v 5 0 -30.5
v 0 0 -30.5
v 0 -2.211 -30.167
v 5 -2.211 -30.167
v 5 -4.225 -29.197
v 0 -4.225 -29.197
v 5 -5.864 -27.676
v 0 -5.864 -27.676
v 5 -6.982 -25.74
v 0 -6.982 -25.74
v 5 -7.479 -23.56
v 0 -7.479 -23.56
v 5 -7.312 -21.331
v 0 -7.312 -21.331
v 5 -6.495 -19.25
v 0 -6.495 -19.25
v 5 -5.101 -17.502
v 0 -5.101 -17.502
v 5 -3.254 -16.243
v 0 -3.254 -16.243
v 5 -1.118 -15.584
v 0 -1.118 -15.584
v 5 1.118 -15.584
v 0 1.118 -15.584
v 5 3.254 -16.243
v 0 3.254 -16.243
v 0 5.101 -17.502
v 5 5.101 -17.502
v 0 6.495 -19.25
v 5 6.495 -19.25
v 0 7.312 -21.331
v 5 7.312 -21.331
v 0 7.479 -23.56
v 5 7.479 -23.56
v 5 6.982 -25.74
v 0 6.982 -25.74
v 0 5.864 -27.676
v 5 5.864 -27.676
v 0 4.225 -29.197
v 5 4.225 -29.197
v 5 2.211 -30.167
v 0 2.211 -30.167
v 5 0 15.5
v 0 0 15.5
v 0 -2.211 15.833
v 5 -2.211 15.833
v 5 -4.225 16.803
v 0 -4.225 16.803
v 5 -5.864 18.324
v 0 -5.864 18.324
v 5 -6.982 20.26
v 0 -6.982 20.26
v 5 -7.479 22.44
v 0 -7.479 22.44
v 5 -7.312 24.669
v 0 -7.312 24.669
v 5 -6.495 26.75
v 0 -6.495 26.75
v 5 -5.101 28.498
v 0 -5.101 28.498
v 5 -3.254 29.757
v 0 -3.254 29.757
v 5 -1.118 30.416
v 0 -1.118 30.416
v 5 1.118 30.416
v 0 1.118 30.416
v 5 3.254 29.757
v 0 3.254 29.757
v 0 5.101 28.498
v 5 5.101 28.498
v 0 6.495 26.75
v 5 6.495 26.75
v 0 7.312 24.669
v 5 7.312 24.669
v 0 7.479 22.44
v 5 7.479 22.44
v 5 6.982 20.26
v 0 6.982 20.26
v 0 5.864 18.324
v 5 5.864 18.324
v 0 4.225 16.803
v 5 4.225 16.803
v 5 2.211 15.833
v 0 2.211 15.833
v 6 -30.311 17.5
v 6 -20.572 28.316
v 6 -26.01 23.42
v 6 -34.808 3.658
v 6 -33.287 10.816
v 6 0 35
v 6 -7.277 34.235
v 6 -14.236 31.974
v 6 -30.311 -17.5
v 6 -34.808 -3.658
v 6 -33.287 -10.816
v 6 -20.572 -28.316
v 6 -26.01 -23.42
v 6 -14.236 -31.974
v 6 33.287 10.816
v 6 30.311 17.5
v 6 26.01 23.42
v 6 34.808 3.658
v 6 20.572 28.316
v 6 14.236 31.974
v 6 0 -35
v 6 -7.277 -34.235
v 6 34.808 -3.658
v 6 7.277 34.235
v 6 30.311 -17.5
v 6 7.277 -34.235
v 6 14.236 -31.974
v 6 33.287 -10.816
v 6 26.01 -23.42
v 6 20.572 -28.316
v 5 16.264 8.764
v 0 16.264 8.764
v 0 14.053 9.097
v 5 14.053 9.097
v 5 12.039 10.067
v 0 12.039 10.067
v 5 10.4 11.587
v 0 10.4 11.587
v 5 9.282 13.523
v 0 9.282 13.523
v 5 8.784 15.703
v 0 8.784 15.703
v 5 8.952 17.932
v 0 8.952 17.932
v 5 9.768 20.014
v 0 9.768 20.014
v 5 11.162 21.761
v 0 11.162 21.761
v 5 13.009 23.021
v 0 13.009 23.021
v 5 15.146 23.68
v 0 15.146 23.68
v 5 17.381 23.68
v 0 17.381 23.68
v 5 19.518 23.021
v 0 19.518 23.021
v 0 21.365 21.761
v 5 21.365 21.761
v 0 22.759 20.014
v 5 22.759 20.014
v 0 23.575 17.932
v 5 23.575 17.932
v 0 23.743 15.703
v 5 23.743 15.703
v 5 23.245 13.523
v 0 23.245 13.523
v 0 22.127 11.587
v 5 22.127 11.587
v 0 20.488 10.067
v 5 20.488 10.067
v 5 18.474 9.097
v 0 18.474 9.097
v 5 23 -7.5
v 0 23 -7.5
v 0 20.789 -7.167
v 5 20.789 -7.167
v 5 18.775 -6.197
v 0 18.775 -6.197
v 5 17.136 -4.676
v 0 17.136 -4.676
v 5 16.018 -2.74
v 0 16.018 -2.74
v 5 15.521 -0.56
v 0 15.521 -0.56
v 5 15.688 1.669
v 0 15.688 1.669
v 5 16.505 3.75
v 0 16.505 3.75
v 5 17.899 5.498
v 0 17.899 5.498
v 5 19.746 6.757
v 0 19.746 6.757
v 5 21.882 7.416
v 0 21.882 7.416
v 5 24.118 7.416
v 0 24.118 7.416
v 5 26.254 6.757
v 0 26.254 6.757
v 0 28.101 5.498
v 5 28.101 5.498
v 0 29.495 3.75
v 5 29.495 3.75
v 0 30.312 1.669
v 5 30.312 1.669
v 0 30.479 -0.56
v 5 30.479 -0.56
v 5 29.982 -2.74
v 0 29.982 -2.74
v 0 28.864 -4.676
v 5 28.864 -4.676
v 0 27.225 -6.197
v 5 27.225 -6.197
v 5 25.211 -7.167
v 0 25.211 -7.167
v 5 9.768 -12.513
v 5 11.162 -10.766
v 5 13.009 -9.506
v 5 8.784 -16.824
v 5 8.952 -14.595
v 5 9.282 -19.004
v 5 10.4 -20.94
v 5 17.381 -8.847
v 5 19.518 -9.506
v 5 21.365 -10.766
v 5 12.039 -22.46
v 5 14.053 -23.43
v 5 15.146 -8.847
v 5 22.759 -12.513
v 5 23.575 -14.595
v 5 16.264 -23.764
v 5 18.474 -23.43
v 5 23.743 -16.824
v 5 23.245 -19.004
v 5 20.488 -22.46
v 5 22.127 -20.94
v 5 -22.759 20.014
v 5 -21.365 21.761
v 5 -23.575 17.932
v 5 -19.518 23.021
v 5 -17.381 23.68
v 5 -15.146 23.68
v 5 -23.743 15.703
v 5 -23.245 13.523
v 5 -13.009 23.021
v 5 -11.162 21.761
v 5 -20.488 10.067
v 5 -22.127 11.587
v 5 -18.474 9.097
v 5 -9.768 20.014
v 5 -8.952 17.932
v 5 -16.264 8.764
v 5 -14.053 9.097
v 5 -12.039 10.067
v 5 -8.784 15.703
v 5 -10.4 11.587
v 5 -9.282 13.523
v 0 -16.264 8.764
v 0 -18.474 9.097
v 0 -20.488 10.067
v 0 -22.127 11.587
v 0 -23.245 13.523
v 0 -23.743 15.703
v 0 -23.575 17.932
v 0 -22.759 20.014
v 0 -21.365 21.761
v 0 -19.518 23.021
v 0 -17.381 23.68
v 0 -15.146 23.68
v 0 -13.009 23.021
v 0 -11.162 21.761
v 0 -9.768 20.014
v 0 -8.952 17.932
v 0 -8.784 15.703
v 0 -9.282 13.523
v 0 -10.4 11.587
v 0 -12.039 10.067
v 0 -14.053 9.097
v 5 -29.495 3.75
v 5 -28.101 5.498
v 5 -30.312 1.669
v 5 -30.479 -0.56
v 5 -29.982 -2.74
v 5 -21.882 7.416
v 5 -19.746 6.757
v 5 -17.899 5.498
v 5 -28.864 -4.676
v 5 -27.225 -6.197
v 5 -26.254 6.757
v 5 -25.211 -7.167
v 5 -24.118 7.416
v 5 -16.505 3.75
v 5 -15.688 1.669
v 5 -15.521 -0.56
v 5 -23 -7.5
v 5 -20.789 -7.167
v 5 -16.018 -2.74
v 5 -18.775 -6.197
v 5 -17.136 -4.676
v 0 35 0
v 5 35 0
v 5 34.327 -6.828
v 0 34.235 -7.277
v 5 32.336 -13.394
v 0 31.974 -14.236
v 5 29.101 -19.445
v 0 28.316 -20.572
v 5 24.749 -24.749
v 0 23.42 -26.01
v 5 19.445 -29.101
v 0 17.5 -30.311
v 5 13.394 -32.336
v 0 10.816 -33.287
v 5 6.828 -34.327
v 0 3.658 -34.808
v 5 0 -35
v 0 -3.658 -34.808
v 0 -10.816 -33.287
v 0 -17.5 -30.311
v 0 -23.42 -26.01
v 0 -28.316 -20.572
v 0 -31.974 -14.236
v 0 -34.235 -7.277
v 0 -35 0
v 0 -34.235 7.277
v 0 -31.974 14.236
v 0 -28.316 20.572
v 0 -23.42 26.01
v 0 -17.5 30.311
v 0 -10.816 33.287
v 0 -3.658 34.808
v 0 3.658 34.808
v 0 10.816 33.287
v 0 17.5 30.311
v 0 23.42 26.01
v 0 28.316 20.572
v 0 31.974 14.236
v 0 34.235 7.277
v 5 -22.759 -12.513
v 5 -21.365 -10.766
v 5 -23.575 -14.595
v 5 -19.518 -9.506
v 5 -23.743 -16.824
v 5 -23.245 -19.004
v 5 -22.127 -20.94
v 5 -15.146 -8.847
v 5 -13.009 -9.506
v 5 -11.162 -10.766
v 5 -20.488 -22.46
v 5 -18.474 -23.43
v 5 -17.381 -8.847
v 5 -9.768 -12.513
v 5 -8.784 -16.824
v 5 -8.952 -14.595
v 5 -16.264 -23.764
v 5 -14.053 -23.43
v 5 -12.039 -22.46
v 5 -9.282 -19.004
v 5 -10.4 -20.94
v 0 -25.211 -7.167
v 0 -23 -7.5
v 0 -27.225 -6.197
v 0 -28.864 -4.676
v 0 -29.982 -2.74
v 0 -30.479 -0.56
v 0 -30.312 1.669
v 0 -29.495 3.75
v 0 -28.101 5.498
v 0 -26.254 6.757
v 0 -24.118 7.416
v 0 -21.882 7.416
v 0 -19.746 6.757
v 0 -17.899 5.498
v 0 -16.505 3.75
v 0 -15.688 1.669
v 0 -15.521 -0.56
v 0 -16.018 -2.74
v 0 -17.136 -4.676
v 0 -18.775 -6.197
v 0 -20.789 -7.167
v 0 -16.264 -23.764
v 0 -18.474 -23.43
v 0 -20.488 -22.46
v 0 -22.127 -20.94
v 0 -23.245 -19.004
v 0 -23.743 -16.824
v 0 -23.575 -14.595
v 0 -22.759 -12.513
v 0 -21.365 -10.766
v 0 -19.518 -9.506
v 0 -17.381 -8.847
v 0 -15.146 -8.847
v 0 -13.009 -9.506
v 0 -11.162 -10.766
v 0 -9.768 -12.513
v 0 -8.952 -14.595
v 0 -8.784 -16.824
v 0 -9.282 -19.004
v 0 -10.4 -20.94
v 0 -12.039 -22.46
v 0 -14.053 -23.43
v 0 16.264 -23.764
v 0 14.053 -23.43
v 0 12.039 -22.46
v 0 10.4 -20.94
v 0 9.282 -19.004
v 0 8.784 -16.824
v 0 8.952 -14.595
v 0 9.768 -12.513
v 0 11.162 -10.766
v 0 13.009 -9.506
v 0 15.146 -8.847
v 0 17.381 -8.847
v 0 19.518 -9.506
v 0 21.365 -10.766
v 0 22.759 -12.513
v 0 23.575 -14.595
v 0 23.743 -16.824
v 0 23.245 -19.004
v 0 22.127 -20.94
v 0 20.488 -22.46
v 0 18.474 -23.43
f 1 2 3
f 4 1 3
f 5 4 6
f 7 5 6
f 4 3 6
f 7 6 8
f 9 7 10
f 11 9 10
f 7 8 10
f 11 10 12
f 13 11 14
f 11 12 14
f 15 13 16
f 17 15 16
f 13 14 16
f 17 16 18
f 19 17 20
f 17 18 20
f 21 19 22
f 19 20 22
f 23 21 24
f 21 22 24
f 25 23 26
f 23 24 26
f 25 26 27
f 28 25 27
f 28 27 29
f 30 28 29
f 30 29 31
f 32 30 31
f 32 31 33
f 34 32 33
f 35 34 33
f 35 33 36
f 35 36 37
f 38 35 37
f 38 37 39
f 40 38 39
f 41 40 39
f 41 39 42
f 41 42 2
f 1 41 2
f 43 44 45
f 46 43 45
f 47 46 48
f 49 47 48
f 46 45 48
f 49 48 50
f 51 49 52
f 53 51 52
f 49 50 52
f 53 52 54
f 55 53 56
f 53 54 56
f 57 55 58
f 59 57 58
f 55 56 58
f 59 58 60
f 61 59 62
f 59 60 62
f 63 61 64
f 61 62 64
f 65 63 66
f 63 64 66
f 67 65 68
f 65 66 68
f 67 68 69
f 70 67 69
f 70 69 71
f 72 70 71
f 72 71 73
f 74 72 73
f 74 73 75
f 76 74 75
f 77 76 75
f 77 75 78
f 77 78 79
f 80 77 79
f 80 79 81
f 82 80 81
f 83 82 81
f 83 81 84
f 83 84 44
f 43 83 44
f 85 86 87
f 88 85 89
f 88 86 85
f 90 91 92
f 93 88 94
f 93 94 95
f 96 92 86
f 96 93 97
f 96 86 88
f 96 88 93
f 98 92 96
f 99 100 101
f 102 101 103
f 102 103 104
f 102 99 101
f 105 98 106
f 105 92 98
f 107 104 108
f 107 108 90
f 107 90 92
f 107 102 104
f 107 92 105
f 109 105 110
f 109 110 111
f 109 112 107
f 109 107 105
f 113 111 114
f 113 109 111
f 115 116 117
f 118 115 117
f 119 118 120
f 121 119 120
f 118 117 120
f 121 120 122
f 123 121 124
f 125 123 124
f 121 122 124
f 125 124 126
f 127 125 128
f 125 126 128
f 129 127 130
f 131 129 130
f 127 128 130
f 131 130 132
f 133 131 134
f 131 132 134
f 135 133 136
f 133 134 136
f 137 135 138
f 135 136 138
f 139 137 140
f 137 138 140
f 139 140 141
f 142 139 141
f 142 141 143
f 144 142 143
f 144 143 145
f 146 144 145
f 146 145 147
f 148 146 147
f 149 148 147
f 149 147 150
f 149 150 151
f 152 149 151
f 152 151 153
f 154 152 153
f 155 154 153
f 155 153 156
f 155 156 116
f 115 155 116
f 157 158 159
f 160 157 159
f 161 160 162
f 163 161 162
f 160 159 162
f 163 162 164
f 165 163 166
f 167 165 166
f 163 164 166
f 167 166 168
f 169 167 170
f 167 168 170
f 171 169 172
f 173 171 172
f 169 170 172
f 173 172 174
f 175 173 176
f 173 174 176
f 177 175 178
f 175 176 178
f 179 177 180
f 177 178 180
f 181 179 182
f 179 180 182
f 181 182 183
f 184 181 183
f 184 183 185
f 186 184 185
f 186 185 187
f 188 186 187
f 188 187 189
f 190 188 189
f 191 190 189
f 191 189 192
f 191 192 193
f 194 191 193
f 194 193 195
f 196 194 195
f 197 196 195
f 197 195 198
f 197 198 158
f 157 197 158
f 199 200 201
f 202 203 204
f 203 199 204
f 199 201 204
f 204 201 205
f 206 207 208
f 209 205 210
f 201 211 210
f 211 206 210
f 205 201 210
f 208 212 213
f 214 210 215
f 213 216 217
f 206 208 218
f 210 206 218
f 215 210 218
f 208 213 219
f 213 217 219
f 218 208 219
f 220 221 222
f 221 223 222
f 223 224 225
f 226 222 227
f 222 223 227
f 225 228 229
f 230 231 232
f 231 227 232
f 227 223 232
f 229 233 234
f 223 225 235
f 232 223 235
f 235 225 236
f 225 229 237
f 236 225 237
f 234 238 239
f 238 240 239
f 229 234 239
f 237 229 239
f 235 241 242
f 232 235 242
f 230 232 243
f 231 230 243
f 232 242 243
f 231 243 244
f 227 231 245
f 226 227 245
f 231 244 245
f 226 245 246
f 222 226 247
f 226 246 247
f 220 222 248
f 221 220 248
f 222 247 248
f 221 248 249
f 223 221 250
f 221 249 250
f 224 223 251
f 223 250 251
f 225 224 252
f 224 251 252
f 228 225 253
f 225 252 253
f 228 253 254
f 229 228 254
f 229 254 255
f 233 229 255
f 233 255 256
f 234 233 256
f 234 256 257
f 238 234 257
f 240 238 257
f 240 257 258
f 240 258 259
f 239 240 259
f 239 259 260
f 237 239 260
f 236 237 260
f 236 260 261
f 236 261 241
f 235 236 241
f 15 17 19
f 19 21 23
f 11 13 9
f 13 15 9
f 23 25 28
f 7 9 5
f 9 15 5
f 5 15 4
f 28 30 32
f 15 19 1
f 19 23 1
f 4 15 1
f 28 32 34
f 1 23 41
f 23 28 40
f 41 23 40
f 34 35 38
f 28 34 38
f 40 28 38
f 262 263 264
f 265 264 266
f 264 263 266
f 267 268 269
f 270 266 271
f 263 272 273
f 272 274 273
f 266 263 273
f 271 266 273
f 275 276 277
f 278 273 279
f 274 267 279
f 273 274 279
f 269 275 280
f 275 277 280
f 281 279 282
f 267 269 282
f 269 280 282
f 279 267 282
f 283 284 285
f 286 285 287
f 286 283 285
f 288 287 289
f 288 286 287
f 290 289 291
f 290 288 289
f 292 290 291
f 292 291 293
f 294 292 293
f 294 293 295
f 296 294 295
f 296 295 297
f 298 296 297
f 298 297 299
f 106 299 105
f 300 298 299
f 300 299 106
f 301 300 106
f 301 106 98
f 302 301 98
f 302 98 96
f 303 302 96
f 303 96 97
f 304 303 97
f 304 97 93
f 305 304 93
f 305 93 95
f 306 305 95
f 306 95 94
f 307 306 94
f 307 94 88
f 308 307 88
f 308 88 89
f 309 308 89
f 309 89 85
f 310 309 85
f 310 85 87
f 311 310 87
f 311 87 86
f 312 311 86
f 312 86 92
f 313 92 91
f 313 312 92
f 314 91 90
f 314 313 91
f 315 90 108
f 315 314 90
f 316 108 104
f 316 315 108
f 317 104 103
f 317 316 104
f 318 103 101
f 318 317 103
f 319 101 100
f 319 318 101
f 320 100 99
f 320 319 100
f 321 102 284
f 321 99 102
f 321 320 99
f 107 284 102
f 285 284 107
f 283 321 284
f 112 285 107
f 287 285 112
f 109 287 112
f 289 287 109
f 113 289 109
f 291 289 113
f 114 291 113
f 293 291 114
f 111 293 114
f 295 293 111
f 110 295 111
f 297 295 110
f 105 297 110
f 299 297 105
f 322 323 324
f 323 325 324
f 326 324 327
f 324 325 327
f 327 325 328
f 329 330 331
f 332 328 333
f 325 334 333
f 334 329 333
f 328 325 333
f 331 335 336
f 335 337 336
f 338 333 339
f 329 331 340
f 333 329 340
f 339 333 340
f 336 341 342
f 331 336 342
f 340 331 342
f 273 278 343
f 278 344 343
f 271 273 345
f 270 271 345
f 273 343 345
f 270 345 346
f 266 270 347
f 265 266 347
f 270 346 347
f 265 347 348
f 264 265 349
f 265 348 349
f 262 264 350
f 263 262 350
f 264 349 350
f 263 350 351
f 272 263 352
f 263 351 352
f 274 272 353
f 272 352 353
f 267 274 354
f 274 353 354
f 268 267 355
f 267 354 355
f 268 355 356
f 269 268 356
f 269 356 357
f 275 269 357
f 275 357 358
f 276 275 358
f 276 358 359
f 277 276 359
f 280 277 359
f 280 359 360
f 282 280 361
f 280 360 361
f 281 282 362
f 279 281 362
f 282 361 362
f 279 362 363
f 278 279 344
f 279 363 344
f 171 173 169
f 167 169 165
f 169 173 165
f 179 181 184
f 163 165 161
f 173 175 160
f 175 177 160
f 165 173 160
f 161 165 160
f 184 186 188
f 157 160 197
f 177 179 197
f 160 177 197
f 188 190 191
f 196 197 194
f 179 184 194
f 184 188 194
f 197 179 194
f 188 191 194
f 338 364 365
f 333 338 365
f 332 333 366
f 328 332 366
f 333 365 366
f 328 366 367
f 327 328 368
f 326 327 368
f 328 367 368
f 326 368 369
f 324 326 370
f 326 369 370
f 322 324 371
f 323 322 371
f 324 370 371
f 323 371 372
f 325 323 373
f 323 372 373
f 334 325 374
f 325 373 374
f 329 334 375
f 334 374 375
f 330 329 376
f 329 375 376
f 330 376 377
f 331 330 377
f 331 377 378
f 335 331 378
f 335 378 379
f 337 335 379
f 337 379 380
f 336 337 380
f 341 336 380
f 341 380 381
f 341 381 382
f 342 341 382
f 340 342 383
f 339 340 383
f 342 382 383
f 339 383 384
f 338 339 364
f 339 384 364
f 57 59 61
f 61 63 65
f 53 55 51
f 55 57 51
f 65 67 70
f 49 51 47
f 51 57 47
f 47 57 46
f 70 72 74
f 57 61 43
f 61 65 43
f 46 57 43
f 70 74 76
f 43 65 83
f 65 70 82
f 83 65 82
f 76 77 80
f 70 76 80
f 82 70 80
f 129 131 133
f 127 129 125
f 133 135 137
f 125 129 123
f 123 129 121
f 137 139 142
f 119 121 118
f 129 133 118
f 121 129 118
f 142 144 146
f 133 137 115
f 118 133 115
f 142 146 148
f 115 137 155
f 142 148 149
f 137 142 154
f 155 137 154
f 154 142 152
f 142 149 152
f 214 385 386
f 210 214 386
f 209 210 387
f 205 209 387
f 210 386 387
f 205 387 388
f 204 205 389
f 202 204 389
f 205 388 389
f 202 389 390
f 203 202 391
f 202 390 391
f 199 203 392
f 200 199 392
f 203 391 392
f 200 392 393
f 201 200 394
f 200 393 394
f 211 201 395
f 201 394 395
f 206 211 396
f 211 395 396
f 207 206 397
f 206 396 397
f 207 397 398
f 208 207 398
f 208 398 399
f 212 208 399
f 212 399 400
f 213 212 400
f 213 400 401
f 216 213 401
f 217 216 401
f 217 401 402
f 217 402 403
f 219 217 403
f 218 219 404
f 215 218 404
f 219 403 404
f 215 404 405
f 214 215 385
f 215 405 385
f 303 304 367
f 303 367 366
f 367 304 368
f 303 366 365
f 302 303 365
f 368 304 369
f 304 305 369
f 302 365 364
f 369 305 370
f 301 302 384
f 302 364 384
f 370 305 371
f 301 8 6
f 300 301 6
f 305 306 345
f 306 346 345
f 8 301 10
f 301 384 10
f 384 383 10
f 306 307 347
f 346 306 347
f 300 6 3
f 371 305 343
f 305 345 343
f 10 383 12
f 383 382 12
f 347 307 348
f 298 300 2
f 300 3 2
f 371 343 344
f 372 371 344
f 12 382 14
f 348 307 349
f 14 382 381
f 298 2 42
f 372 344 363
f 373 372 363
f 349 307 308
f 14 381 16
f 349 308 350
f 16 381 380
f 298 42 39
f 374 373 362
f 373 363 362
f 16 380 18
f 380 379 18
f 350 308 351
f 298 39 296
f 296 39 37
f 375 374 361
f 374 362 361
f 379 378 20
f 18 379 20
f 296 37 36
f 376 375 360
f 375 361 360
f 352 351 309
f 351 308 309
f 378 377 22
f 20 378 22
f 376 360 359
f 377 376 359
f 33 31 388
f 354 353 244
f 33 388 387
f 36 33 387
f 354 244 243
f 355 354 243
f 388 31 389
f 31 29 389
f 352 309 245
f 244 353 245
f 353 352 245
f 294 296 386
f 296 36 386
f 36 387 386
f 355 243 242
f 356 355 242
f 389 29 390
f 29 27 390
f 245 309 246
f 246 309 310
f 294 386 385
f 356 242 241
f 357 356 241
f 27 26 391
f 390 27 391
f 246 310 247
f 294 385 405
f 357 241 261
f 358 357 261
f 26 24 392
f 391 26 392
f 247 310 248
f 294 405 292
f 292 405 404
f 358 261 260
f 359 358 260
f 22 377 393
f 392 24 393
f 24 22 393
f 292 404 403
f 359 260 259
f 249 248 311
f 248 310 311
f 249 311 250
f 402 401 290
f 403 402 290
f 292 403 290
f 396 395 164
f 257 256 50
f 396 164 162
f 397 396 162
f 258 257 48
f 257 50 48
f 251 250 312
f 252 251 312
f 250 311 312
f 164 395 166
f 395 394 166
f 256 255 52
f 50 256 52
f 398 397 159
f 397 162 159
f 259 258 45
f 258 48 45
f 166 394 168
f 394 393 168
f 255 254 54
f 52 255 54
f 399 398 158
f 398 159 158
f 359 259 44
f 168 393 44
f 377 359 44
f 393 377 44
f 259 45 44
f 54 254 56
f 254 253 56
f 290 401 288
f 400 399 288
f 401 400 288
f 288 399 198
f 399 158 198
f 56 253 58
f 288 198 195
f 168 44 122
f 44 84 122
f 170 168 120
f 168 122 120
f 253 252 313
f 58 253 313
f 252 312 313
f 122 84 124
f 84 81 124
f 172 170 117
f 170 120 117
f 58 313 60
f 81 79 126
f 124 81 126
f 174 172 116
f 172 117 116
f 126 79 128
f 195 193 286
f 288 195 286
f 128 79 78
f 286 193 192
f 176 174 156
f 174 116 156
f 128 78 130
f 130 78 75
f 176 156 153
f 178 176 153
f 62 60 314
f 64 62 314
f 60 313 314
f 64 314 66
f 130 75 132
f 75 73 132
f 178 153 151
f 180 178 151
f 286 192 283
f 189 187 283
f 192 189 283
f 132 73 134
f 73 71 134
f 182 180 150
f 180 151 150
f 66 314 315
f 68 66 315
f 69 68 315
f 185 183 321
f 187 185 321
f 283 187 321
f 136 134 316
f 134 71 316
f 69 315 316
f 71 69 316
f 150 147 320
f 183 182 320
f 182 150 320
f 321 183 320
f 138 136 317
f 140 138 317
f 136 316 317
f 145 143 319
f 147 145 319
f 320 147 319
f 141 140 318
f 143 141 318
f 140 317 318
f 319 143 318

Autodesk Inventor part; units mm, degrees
ref_plane "YZ Plane" through (0, 0, 0) normal (1, 0, 0) x (0, 1, 0)
ref_plane "XZ Plane" through (0, 0, 0) normal (0, 1, 0) x (-1, 0, 0)
ref_plane "XY Plane" through (0, 0, 0) normal (0, 0, 1) x (1, 0, 0)
sketch "Sketch1" plane through (0, 0, 0) normal (1, 0, 0) x (0, 1, 0)
  circle A0 centre (0, 0) radius 35
  dimension "d0" = 70
extrude "Extrusion1" add sketch "Sketch1" along normal blind 5
sketch "Sketch2" plane through (5, 0, 0) normal (1, 0, 0) x (0, 0, -1)
  circle A0 centre (0, 0) radius 35 projected
  circle A1 centre (0, 0) radius 23 construction
  point P0 (23, 0)
  point P1 (16.2635, 16.2635)
  point P2 (0, 23)
  point P3 (-16.2635, 16.2635)
  point P4 (-23, 0)
  point P5 (-16.2635, -16.2635)
  point P6 (0, -23)
  point P7 (16.2635, -16.2635)
  dimension "d3" = 46
  dimension "d6" = 360
hole "Hole1" at (5, 0, -23) at (5, 16.2635, -16.2635) at (5, 23, 0) at (5, 16.2635, 16.2635) at (5, 0, 23) at (5, -16.2635, 16.2635) at (5, -23, 0) at (5, -16.2635, -16.2635) direction (-1, 0, 0) diameter 15 end through all
sketch "Sketch3" plane through (5, 0, 0) normal (1, 0, 0) x (0, 0, -1)
  circle A0 centre (0, -23) radius 7.5 projected
  circle A1 centre (-23, 0) radius 7.5 projected
  circle A2 centre (0, 23) radius 7.5 projected
  circle A3 centre (23, 0) radius 7.5 projected
  circle A4 centre (16.2635, 16.2635) radius 7.5 projected
  circle A5 centre (-16.2635, 16.2635) radius 7.5 projected
  circle A6 centre (-16.2635, -16.2635) radius 7.5 projected
  circle A7 centre (16.2635, -16.2635) radius 7.5 projected
  circle A8 centre (0, 0) radius 35 projected
extrude "Extrusion2" add sketch "Sketch3" along normal blind 1 contours A0 | A1 | A2 | A3 | A4 | A5 | A6 | A7 | A8
properties part number "MAGNETPLATE CONCEPT"
